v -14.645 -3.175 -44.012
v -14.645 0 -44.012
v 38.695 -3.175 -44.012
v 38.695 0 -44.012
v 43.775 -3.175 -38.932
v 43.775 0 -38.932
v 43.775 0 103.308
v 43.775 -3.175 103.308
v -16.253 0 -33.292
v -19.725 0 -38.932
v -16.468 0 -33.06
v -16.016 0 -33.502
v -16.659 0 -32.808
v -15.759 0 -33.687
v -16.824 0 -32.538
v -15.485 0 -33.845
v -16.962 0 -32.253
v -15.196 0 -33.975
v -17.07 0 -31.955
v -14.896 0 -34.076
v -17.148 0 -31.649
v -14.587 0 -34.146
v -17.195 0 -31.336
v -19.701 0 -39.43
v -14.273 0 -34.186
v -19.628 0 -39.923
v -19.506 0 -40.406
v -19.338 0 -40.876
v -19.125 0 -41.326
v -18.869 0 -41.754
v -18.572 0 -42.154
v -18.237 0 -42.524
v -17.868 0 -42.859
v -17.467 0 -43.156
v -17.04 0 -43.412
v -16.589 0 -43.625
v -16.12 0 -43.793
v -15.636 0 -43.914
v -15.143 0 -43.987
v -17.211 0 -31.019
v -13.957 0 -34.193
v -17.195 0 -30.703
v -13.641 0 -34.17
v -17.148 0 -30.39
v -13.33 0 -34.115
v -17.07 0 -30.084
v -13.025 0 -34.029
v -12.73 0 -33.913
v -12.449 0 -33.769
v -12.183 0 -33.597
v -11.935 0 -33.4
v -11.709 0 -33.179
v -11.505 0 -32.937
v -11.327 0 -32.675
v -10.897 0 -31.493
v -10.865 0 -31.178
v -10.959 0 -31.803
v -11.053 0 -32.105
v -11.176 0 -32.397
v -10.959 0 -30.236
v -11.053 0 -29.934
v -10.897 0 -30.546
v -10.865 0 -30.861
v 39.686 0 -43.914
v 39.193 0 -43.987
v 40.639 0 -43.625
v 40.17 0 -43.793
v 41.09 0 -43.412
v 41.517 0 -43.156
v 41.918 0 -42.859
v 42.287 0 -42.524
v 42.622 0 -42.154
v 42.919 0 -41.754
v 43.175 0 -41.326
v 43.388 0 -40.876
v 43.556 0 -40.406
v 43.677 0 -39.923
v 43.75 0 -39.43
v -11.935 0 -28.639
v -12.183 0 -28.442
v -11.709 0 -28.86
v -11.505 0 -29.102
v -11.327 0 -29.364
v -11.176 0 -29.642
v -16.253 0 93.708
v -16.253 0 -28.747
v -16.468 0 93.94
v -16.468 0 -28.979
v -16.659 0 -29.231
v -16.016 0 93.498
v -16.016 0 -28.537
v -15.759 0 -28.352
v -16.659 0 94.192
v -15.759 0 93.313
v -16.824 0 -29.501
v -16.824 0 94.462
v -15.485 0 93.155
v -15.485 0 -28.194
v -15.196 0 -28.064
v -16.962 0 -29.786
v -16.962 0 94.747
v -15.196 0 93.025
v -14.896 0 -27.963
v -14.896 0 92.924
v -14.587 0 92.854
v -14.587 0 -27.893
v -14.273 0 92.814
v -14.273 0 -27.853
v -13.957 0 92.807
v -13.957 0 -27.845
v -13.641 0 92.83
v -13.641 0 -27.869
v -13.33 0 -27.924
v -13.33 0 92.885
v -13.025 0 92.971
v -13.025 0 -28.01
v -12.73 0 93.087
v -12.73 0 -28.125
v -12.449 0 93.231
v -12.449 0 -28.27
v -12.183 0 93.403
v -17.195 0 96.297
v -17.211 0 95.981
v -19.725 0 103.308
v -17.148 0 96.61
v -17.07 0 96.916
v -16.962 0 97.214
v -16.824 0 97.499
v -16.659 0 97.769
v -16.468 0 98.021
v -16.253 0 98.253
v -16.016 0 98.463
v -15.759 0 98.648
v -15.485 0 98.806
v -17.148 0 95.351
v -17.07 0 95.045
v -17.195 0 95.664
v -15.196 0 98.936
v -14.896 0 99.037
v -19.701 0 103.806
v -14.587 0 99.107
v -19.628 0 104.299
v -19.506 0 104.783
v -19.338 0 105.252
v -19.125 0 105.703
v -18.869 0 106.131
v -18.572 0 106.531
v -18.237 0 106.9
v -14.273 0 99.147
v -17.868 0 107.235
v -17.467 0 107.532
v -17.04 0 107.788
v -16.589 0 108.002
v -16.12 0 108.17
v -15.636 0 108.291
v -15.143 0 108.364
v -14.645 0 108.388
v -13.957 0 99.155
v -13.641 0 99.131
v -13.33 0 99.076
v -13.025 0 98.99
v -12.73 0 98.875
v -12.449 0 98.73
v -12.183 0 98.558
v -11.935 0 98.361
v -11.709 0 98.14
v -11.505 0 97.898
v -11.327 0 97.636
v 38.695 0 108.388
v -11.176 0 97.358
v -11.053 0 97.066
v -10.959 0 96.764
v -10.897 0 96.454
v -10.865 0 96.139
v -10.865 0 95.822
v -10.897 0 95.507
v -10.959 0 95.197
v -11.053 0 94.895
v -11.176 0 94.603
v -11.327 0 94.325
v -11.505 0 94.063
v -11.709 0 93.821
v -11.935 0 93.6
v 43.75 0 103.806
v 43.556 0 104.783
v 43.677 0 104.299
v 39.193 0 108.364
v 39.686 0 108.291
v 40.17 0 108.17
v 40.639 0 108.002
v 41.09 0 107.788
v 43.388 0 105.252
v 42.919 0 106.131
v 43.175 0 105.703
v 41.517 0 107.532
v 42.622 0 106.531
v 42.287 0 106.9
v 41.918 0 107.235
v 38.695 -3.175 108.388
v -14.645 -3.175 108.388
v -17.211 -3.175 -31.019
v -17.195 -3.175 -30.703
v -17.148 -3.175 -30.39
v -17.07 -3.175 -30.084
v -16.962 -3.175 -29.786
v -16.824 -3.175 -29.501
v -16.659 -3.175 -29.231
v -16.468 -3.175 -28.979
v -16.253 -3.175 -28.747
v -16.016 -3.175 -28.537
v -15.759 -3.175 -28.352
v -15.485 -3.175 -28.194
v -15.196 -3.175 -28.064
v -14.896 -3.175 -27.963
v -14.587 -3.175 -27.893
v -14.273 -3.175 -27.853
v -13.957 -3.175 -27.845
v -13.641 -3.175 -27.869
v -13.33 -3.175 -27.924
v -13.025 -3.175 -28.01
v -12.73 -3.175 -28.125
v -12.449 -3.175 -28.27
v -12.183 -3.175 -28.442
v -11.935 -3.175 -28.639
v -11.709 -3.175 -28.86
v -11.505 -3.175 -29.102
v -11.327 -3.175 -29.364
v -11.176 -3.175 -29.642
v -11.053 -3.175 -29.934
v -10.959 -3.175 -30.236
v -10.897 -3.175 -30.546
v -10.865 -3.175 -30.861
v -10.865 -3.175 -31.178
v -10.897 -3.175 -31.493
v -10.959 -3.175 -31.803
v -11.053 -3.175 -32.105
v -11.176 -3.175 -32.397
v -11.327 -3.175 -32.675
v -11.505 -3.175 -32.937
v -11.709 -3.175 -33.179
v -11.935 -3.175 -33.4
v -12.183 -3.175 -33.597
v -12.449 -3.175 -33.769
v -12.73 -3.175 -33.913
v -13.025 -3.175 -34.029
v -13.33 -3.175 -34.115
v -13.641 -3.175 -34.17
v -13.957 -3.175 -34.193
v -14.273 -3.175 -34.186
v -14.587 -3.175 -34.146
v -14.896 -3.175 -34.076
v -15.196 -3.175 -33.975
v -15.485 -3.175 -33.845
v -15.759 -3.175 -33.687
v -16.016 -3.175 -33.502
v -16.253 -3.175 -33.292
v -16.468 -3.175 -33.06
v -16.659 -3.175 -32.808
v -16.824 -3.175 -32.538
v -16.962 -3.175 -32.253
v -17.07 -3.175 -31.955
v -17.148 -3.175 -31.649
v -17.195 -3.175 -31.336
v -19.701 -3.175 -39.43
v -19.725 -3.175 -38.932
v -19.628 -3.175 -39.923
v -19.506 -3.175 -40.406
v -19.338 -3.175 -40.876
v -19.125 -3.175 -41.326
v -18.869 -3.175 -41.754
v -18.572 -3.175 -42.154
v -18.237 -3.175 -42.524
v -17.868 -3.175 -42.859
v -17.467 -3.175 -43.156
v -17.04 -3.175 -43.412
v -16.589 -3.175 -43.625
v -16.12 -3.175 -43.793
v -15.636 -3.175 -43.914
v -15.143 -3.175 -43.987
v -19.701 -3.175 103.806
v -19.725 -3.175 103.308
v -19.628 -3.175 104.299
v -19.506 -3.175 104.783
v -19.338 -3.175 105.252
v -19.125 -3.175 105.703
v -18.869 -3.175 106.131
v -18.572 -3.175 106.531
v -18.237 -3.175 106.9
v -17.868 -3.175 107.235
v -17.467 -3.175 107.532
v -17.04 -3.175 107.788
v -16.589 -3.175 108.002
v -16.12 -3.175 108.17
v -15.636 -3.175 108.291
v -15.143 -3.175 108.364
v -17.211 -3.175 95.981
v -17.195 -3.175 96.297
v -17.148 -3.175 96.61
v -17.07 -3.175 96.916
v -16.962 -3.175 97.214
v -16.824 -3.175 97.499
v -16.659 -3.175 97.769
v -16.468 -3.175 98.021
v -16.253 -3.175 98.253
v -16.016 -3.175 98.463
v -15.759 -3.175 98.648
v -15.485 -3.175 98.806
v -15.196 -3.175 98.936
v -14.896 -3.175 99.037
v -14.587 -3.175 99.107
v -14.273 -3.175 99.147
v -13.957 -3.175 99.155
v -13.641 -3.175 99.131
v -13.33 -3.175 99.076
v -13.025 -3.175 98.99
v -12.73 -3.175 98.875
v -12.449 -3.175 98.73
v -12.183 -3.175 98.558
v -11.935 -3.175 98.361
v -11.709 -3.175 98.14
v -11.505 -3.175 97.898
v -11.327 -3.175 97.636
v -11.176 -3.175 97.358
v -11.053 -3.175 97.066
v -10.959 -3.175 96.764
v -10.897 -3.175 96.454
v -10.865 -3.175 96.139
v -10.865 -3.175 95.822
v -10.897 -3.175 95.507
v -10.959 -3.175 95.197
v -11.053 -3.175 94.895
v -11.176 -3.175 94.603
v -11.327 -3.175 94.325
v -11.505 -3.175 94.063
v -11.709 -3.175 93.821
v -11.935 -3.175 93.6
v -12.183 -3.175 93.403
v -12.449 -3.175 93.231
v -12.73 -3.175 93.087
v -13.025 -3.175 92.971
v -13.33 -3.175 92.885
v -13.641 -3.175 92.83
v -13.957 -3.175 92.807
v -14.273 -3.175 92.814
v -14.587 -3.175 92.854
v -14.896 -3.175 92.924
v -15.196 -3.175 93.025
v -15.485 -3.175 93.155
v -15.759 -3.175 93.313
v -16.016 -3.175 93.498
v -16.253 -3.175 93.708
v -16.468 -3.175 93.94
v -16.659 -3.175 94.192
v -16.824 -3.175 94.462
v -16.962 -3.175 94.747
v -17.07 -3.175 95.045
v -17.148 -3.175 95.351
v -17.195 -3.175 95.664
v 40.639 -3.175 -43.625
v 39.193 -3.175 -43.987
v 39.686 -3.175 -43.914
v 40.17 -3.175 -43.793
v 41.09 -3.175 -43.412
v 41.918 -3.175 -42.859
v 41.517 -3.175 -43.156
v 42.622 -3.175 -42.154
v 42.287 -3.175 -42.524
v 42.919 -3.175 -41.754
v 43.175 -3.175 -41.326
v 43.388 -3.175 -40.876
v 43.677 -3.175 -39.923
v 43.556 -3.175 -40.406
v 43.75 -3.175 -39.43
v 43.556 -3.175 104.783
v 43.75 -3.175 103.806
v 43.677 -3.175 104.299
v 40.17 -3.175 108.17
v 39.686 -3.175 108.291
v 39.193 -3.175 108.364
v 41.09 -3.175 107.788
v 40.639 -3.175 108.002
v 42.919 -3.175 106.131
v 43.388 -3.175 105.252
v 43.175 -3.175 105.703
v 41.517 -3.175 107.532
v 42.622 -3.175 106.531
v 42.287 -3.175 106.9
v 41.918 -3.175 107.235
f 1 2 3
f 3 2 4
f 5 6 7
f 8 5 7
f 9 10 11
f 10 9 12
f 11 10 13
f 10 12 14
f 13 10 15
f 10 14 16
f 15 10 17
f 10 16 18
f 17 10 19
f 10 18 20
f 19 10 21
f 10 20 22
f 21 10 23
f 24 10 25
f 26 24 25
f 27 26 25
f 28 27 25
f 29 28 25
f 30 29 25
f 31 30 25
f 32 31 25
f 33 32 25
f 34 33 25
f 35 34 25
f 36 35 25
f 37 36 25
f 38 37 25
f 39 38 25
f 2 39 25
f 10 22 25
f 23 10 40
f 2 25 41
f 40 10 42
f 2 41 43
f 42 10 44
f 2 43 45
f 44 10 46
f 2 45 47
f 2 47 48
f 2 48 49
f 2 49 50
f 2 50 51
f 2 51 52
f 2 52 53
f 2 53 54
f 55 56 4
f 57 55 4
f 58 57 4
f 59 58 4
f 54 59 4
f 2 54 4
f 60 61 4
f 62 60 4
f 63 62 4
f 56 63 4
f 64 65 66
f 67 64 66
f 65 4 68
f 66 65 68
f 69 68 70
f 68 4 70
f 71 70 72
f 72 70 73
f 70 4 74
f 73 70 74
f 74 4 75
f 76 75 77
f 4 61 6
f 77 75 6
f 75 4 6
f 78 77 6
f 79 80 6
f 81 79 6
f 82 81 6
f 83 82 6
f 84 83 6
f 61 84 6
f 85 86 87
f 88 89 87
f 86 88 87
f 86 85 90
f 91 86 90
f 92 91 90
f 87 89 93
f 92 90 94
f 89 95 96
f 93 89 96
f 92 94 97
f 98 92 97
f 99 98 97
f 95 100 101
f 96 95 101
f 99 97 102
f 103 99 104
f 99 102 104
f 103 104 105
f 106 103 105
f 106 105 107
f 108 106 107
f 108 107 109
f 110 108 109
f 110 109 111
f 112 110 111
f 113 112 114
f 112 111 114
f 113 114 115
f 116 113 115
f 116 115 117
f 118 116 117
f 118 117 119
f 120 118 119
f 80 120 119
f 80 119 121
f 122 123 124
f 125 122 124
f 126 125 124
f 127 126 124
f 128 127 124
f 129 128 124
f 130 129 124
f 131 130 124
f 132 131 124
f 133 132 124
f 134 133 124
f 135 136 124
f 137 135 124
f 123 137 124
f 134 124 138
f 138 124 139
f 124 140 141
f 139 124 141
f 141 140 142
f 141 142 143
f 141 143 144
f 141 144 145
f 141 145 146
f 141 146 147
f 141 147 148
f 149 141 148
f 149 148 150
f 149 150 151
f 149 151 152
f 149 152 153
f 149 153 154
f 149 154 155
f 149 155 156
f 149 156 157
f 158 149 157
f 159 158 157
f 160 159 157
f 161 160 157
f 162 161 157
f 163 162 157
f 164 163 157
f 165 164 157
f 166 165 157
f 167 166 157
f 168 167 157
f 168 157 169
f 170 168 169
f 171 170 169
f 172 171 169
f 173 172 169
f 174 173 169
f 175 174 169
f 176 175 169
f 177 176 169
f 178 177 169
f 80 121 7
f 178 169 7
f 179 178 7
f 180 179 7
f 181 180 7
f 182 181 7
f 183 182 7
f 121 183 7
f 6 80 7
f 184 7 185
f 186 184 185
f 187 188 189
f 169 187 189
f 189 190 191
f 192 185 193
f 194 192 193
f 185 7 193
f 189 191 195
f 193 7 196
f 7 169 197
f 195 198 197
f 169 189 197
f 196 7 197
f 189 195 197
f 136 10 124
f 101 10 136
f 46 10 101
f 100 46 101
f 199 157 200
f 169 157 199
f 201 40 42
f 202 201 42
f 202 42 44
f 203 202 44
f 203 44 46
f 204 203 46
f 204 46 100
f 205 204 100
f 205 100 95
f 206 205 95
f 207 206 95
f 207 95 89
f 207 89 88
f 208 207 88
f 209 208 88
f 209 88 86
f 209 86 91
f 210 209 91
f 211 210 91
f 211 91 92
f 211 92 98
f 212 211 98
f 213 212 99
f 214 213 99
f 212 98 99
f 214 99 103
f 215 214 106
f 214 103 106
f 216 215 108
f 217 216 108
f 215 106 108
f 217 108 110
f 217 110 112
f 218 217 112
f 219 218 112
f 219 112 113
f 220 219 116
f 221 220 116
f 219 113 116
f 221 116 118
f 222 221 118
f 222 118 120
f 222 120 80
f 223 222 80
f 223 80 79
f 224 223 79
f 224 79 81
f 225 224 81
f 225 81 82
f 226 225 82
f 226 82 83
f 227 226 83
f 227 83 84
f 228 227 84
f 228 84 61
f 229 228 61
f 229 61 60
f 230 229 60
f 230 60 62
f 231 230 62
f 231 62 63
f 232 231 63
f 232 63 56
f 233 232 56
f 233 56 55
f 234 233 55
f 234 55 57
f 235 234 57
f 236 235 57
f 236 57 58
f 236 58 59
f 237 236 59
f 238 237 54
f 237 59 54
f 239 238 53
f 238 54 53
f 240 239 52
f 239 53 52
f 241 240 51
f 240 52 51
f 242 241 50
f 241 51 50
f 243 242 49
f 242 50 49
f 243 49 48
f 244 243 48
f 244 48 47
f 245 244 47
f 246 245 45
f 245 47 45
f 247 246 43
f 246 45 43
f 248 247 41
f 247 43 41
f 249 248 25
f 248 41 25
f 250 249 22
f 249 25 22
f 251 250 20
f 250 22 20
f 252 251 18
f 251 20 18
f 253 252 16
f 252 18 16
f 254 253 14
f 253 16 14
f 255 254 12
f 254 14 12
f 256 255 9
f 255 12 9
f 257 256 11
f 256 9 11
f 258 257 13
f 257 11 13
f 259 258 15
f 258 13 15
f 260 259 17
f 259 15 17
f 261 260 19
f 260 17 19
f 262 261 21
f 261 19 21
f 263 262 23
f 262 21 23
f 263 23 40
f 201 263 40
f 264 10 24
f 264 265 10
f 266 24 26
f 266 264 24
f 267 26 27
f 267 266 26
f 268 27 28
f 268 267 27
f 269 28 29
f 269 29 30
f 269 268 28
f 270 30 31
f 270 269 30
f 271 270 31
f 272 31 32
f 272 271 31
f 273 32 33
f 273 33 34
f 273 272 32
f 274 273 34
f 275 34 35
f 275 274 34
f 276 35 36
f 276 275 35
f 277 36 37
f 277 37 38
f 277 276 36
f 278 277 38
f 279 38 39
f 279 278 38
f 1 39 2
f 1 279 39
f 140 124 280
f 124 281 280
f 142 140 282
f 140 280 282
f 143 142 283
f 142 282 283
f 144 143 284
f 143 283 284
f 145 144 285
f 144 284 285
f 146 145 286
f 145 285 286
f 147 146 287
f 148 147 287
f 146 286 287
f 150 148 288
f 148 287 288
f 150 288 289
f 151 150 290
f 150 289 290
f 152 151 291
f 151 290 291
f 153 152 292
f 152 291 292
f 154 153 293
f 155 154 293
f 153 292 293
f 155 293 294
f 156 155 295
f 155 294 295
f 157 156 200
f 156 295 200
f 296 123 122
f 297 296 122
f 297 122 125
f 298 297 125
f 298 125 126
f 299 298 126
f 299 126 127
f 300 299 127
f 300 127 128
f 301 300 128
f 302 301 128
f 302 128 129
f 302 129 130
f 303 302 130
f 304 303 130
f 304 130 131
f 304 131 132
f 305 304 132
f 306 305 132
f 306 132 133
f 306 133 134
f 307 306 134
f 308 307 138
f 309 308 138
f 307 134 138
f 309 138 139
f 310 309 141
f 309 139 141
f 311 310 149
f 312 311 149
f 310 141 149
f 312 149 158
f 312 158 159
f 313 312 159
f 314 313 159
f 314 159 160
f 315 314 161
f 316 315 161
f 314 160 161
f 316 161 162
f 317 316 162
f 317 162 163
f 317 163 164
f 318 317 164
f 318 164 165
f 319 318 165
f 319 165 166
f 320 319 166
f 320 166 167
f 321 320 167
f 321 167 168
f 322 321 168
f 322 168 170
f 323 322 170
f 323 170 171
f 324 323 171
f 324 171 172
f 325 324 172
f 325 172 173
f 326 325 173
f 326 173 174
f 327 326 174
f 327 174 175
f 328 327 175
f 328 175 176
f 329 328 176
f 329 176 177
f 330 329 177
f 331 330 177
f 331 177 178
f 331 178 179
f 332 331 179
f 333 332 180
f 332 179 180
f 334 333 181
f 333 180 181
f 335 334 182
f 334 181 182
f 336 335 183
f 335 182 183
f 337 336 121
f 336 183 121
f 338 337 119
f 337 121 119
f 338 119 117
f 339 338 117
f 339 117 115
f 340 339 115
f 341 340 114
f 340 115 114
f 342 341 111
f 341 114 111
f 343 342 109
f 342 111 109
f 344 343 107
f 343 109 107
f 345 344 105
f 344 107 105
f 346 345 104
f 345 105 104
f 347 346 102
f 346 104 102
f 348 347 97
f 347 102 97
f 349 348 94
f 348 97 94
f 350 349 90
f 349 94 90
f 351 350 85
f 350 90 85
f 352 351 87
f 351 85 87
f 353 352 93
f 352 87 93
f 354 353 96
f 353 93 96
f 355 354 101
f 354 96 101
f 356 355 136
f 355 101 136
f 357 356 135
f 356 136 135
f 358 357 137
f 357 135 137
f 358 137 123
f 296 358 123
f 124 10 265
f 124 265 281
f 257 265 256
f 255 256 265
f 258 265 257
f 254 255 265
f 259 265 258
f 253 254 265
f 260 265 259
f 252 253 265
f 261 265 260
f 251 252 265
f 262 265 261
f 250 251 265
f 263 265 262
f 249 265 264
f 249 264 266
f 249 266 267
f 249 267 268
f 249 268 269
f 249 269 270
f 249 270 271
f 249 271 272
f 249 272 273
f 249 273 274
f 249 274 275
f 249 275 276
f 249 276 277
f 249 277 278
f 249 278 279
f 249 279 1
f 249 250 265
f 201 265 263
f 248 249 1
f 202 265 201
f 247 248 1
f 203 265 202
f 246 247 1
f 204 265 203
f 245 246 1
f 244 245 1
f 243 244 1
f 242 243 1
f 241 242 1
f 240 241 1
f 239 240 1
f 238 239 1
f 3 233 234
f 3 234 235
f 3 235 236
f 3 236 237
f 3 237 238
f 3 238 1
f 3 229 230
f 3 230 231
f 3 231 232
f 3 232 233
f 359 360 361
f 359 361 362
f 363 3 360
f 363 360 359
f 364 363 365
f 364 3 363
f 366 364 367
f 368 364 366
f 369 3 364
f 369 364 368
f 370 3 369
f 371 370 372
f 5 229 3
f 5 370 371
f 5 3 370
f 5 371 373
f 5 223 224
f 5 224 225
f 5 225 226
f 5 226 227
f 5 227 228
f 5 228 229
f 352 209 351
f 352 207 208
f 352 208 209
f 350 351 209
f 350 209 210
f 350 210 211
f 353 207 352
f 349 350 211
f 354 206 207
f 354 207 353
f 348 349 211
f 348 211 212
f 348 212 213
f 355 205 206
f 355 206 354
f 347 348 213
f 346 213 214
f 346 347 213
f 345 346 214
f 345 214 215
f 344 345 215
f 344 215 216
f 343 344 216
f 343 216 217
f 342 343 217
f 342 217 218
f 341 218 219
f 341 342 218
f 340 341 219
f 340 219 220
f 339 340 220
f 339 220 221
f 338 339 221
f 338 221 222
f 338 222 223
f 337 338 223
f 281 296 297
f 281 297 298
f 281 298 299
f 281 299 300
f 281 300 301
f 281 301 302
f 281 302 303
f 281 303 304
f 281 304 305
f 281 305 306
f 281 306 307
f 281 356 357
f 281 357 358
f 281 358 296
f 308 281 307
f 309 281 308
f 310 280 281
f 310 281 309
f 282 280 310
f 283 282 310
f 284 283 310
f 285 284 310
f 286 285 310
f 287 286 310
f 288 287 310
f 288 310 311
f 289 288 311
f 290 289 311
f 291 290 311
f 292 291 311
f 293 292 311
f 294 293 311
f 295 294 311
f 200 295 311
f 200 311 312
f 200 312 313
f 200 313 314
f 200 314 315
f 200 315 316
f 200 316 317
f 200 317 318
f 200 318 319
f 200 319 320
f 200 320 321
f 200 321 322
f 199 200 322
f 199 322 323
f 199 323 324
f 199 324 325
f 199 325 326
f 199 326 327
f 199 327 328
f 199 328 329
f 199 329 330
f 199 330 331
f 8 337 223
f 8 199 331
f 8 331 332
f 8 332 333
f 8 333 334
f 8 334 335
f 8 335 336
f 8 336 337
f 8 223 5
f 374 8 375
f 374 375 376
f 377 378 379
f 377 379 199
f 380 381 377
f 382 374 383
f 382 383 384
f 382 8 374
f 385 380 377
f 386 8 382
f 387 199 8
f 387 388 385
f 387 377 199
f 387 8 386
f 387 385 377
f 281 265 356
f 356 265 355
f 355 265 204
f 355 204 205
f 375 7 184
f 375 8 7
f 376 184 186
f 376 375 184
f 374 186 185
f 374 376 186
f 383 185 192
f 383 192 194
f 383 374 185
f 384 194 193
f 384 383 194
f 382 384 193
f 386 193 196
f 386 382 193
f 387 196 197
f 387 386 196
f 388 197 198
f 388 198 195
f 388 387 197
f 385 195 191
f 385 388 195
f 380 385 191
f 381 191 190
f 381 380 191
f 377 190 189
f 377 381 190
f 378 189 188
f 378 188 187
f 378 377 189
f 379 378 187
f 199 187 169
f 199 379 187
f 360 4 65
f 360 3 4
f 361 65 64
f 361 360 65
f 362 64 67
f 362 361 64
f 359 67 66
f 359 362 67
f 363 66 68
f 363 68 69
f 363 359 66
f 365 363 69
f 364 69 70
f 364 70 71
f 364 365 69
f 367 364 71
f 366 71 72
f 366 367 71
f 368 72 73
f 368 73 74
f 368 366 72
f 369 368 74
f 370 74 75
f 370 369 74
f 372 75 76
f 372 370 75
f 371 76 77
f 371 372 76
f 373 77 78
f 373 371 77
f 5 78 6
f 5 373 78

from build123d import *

# Parameters (mm, degrees)
F0_W     = 63.5
F0_H     = 152.4
F1_DEPTH = 3.175
F2_R     = 5.08
F4_D     = 6.35
F5_D     = 6.35


with BuildPart() as f1:
    # F0 (on Front) → F1 (new body)
    with BuildSketch(Plane.XZ):
        with Locations((12.024884, 32.188336)):
            Rectangle(F0_W, F0_H)
    extrude(amount=F1_DEPTH)

    # F2
    f2_edges = [f1.edges().sort_by_distance(p)[0] for p in [
        (-19.725116, -1.5875, 108.388336),
        (43.774884, -1.5875, 108.388336),
        (43.774884, -1.5875, -44.011664),
        (-19.725116, -1.5875, -44.011664),
    ]]
    fillet(f2_edges, radius=F2_R)

    # F4 (through all)
    with Locations(Plane.XZ.offset(3.175)):
        with Locations((-14.036109, 95.980532)):
            Hole(F4_D / 2)

    # F5 (through all)
    with Locations(Plane.XZ.offset(3.175)):
        with Locations((-14.036109, -31.019468)):
            Hole(F5_D / 2)


solid = f1.part
